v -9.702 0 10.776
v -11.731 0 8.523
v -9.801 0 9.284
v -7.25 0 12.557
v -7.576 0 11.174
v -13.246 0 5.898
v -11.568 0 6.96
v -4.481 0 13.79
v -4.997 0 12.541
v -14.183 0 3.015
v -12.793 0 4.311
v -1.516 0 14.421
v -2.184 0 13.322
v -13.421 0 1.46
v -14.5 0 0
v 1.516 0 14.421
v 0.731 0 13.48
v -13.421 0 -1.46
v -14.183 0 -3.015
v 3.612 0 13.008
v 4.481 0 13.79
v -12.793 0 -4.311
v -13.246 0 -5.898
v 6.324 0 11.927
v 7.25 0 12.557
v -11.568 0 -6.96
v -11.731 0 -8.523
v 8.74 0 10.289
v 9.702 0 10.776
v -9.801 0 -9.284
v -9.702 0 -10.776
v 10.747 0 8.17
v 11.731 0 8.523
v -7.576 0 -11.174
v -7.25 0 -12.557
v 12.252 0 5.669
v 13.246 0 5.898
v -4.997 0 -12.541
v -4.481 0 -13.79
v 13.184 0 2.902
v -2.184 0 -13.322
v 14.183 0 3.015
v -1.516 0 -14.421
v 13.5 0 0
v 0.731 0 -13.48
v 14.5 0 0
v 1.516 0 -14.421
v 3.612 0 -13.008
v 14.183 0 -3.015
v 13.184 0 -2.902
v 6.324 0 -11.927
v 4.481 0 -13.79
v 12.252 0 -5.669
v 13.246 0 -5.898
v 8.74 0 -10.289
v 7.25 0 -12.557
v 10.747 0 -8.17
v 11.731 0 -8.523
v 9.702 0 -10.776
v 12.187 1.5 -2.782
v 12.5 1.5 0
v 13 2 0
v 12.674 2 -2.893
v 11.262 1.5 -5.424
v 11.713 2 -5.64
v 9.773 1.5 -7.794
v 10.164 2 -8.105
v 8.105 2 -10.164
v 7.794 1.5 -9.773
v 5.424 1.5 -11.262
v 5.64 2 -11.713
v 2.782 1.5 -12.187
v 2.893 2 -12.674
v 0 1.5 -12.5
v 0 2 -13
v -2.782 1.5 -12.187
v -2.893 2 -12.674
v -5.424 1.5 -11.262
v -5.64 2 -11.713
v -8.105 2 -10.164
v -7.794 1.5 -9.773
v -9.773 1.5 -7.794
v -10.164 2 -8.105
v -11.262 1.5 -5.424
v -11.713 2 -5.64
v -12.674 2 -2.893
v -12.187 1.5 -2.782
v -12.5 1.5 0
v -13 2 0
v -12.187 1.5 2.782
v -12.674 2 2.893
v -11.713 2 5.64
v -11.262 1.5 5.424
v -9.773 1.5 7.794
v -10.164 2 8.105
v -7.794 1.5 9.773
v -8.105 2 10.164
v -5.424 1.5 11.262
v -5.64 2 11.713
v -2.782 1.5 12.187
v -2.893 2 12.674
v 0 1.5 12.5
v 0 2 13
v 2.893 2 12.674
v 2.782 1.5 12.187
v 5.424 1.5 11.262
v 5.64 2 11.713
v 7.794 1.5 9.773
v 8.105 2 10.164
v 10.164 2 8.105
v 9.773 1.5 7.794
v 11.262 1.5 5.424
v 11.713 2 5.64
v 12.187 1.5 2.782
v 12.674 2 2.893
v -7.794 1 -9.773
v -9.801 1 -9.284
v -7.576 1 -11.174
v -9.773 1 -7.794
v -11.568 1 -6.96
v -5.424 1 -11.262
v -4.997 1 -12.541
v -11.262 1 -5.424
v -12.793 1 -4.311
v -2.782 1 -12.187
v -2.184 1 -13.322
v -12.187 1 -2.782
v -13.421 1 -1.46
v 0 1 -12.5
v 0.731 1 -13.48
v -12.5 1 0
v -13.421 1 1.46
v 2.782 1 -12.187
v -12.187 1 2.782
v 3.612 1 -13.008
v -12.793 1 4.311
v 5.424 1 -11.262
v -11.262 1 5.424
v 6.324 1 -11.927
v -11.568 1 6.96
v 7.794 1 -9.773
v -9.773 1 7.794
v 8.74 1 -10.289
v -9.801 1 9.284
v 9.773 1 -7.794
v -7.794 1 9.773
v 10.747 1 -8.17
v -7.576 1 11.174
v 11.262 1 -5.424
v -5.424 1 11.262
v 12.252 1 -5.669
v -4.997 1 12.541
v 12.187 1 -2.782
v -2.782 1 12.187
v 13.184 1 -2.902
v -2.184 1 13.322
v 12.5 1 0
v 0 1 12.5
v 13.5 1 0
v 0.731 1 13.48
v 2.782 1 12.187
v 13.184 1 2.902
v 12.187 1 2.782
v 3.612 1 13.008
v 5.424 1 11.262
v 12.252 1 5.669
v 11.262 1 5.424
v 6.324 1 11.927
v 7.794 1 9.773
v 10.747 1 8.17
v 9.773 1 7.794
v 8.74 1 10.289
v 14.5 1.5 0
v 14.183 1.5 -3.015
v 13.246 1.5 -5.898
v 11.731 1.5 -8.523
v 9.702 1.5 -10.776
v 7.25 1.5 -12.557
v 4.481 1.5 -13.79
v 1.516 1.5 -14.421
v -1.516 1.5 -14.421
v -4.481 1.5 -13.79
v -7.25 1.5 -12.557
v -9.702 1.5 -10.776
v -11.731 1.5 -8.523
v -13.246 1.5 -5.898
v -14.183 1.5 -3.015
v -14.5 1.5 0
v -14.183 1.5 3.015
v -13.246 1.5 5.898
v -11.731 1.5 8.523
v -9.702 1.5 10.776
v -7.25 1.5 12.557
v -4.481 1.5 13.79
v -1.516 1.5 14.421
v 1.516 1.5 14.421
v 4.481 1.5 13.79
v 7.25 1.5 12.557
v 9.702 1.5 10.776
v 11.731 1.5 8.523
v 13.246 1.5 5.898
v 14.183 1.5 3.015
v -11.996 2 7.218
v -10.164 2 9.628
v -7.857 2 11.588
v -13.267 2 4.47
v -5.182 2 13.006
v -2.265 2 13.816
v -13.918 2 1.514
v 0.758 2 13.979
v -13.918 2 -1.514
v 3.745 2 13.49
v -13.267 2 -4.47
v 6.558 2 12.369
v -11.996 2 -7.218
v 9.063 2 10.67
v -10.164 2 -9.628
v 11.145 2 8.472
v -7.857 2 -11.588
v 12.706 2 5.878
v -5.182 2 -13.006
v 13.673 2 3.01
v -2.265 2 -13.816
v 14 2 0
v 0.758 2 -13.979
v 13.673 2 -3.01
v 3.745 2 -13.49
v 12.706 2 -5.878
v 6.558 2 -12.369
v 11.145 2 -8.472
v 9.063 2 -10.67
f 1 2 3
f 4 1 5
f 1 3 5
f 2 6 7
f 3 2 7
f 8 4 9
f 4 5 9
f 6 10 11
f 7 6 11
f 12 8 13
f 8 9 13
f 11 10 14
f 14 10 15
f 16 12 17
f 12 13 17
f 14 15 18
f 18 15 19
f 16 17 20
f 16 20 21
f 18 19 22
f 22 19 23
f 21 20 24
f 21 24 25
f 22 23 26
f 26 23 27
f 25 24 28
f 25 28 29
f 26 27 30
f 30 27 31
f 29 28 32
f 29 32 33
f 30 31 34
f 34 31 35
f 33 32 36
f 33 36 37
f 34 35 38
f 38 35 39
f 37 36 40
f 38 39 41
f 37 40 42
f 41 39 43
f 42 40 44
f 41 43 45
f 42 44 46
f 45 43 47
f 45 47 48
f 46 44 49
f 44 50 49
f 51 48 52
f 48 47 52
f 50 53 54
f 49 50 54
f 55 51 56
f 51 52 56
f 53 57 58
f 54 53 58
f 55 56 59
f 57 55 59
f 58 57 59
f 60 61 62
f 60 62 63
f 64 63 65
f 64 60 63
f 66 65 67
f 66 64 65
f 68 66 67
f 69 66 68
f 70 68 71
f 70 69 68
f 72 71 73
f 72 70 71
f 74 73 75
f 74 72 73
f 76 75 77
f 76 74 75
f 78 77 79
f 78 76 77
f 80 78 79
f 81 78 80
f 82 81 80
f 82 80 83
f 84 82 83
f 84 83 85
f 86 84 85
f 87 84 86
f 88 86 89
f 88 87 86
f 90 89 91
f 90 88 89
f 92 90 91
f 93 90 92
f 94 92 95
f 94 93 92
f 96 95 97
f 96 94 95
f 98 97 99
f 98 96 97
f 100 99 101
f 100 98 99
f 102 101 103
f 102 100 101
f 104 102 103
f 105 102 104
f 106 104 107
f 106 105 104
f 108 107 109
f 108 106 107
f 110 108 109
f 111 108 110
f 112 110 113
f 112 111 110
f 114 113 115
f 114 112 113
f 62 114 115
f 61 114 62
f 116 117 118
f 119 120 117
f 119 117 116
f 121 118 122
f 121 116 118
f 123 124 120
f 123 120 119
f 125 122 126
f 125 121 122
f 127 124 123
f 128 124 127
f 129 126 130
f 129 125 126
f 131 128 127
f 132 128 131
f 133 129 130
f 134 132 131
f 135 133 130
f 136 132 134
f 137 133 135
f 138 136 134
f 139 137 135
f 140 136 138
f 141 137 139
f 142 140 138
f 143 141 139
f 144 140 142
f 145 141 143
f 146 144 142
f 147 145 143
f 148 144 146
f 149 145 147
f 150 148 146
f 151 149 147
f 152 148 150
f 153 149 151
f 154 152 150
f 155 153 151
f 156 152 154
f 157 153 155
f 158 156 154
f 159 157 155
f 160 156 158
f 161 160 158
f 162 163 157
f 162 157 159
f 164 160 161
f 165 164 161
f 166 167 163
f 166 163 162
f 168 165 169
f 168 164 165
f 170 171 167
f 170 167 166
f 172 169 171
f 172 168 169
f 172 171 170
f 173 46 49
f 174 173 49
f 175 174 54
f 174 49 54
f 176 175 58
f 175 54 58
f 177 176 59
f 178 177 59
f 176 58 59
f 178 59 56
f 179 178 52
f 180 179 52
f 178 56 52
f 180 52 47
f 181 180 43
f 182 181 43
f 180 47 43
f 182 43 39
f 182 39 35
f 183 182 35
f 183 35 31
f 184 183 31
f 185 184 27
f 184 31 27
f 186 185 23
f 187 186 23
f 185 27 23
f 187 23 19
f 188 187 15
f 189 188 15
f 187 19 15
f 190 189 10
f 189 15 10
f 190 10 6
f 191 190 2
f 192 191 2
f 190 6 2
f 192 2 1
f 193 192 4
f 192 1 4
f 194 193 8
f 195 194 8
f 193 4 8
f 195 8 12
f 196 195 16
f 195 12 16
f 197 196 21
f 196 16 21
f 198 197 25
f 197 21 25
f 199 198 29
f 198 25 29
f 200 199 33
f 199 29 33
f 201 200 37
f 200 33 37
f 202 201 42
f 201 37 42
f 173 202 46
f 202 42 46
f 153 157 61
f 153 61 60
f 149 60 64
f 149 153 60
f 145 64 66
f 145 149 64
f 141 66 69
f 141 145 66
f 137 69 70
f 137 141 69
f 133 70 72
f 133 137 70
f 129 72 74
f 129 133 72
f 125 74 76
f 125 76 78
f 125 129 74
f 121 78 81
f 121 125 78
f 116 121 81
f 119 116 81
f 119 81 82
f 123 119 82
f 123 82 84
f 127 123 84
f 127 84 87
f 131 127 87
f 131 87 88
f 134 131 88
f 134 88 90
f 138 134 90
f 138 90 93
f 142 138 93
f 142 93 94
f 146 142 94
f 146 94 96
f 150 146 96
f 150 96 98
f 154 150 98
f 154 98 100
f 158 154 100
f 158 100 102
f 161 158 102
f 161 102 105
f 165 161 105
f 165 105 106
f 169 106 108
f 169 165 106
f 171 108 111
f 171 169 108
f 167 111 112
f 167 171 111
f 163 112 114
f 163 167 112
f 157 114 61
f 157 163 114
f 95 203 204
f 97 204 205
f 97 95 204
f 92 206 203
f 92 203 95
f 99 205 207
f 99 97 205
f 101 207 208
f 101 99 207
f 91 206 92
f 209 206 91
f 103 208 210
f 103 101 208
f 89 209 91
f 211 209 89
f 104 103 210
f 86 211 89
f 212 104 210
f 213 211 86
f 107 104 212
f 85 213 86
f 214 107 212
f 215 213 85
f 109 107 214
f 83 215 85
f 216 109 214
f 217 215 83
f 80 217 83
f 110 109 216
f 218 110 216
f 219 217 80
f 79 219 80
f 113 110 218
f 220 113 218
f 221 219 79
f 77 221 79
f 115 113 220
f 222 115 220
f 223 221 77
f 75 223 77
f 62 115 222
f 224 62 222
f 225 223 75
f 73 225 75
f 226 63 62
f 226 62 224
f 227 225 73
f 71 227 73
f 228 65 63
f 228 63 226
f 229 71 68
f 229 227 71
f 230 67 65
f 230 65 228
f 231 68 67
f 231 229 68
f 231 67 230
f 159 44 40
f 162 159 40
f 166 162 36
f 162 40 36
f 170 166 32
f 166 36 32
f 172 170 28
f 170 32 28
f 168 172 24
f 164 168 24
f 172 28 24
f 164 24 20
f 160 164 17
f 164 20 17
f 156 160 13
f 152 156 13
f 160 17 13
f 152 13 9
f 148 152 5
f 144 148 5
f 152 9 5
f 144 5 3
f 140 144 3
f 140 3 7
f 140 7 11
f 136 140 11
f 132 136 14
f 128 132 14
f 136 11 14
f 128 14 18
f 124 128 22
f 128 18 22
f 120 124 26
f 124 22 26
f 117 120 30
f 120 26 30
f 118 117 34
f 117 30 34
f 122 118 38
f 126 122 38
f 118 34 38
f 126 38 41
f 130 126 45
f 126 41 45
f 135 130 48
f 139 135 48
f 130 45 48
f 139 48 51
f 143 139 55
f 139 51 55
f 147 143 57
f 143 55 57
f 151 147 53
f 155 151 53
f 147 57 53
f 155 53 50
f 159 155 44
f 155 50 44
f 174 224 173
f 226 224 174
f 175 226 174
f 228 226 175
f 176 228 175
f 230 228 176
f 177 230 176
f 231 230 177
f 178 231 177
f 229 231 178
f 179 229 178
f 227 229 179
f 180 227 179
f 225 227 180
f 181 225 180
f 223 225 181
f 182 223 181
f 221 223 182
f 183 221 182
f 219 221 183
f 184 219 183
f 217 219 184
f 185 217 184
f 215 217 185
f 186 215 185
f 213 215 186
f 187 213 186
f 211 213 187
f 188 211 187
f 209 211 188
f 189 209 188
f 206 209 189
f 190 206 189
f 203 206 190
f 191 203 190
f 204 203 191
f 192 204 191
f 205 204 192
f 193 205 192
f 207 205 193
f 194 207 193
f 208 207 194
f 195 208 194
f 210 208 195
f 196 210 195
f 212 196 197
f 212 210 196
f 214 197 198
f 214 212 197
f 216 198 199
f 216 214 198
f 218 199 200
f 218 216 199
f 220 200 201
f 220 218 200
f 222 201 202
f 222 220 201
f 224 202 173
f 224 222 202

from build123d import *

# Parameters (mm, degrees)
SKETCH1_R           = 14.5
SKETCH1_R_2         = 12.5
BOSS_EXTRUDE1_DEPTH = 2
SKETCH2_R           = 13.5
CUT_EXTRUDE1_DEPTH  = 1
CHAMFER1_SIZE       = 0.5


with BuildPart() as part:
    # Sketch1 → Boss-Extrude1 (new body)
    with BuildSketch(Plane(origin=(0, 0, 0), x_dir=(1, 0, 0), z_dir=(0, 1, 0))):
        Circle(SKETCH1_R)
        Circle(SKETCH1_R_2, mode=Mode.SUBTRACT)
    extrude(amount=BOSS_EXTRUDE1_DEPTH)

    # Sketch2 → Cut-Extrude1 (cut)
    with BuildSketch(Plane.XZ):
        Circle(SKETCH2_R)
    extrude(amount=-CUT_EXTRUDE1_DEPTH, mode=Mode.SUBTRACT)

    # Chamfer1
    chamfer1_edges = [part.edges().sort_by_distance(p)[0] for p in [
        (-14.5, 2, 0),
        (-12.5, 2, 0),
    ]]
    chamfer(chamfer1_edges, length=CHAMFER1_SIZE)


solid = part.part
